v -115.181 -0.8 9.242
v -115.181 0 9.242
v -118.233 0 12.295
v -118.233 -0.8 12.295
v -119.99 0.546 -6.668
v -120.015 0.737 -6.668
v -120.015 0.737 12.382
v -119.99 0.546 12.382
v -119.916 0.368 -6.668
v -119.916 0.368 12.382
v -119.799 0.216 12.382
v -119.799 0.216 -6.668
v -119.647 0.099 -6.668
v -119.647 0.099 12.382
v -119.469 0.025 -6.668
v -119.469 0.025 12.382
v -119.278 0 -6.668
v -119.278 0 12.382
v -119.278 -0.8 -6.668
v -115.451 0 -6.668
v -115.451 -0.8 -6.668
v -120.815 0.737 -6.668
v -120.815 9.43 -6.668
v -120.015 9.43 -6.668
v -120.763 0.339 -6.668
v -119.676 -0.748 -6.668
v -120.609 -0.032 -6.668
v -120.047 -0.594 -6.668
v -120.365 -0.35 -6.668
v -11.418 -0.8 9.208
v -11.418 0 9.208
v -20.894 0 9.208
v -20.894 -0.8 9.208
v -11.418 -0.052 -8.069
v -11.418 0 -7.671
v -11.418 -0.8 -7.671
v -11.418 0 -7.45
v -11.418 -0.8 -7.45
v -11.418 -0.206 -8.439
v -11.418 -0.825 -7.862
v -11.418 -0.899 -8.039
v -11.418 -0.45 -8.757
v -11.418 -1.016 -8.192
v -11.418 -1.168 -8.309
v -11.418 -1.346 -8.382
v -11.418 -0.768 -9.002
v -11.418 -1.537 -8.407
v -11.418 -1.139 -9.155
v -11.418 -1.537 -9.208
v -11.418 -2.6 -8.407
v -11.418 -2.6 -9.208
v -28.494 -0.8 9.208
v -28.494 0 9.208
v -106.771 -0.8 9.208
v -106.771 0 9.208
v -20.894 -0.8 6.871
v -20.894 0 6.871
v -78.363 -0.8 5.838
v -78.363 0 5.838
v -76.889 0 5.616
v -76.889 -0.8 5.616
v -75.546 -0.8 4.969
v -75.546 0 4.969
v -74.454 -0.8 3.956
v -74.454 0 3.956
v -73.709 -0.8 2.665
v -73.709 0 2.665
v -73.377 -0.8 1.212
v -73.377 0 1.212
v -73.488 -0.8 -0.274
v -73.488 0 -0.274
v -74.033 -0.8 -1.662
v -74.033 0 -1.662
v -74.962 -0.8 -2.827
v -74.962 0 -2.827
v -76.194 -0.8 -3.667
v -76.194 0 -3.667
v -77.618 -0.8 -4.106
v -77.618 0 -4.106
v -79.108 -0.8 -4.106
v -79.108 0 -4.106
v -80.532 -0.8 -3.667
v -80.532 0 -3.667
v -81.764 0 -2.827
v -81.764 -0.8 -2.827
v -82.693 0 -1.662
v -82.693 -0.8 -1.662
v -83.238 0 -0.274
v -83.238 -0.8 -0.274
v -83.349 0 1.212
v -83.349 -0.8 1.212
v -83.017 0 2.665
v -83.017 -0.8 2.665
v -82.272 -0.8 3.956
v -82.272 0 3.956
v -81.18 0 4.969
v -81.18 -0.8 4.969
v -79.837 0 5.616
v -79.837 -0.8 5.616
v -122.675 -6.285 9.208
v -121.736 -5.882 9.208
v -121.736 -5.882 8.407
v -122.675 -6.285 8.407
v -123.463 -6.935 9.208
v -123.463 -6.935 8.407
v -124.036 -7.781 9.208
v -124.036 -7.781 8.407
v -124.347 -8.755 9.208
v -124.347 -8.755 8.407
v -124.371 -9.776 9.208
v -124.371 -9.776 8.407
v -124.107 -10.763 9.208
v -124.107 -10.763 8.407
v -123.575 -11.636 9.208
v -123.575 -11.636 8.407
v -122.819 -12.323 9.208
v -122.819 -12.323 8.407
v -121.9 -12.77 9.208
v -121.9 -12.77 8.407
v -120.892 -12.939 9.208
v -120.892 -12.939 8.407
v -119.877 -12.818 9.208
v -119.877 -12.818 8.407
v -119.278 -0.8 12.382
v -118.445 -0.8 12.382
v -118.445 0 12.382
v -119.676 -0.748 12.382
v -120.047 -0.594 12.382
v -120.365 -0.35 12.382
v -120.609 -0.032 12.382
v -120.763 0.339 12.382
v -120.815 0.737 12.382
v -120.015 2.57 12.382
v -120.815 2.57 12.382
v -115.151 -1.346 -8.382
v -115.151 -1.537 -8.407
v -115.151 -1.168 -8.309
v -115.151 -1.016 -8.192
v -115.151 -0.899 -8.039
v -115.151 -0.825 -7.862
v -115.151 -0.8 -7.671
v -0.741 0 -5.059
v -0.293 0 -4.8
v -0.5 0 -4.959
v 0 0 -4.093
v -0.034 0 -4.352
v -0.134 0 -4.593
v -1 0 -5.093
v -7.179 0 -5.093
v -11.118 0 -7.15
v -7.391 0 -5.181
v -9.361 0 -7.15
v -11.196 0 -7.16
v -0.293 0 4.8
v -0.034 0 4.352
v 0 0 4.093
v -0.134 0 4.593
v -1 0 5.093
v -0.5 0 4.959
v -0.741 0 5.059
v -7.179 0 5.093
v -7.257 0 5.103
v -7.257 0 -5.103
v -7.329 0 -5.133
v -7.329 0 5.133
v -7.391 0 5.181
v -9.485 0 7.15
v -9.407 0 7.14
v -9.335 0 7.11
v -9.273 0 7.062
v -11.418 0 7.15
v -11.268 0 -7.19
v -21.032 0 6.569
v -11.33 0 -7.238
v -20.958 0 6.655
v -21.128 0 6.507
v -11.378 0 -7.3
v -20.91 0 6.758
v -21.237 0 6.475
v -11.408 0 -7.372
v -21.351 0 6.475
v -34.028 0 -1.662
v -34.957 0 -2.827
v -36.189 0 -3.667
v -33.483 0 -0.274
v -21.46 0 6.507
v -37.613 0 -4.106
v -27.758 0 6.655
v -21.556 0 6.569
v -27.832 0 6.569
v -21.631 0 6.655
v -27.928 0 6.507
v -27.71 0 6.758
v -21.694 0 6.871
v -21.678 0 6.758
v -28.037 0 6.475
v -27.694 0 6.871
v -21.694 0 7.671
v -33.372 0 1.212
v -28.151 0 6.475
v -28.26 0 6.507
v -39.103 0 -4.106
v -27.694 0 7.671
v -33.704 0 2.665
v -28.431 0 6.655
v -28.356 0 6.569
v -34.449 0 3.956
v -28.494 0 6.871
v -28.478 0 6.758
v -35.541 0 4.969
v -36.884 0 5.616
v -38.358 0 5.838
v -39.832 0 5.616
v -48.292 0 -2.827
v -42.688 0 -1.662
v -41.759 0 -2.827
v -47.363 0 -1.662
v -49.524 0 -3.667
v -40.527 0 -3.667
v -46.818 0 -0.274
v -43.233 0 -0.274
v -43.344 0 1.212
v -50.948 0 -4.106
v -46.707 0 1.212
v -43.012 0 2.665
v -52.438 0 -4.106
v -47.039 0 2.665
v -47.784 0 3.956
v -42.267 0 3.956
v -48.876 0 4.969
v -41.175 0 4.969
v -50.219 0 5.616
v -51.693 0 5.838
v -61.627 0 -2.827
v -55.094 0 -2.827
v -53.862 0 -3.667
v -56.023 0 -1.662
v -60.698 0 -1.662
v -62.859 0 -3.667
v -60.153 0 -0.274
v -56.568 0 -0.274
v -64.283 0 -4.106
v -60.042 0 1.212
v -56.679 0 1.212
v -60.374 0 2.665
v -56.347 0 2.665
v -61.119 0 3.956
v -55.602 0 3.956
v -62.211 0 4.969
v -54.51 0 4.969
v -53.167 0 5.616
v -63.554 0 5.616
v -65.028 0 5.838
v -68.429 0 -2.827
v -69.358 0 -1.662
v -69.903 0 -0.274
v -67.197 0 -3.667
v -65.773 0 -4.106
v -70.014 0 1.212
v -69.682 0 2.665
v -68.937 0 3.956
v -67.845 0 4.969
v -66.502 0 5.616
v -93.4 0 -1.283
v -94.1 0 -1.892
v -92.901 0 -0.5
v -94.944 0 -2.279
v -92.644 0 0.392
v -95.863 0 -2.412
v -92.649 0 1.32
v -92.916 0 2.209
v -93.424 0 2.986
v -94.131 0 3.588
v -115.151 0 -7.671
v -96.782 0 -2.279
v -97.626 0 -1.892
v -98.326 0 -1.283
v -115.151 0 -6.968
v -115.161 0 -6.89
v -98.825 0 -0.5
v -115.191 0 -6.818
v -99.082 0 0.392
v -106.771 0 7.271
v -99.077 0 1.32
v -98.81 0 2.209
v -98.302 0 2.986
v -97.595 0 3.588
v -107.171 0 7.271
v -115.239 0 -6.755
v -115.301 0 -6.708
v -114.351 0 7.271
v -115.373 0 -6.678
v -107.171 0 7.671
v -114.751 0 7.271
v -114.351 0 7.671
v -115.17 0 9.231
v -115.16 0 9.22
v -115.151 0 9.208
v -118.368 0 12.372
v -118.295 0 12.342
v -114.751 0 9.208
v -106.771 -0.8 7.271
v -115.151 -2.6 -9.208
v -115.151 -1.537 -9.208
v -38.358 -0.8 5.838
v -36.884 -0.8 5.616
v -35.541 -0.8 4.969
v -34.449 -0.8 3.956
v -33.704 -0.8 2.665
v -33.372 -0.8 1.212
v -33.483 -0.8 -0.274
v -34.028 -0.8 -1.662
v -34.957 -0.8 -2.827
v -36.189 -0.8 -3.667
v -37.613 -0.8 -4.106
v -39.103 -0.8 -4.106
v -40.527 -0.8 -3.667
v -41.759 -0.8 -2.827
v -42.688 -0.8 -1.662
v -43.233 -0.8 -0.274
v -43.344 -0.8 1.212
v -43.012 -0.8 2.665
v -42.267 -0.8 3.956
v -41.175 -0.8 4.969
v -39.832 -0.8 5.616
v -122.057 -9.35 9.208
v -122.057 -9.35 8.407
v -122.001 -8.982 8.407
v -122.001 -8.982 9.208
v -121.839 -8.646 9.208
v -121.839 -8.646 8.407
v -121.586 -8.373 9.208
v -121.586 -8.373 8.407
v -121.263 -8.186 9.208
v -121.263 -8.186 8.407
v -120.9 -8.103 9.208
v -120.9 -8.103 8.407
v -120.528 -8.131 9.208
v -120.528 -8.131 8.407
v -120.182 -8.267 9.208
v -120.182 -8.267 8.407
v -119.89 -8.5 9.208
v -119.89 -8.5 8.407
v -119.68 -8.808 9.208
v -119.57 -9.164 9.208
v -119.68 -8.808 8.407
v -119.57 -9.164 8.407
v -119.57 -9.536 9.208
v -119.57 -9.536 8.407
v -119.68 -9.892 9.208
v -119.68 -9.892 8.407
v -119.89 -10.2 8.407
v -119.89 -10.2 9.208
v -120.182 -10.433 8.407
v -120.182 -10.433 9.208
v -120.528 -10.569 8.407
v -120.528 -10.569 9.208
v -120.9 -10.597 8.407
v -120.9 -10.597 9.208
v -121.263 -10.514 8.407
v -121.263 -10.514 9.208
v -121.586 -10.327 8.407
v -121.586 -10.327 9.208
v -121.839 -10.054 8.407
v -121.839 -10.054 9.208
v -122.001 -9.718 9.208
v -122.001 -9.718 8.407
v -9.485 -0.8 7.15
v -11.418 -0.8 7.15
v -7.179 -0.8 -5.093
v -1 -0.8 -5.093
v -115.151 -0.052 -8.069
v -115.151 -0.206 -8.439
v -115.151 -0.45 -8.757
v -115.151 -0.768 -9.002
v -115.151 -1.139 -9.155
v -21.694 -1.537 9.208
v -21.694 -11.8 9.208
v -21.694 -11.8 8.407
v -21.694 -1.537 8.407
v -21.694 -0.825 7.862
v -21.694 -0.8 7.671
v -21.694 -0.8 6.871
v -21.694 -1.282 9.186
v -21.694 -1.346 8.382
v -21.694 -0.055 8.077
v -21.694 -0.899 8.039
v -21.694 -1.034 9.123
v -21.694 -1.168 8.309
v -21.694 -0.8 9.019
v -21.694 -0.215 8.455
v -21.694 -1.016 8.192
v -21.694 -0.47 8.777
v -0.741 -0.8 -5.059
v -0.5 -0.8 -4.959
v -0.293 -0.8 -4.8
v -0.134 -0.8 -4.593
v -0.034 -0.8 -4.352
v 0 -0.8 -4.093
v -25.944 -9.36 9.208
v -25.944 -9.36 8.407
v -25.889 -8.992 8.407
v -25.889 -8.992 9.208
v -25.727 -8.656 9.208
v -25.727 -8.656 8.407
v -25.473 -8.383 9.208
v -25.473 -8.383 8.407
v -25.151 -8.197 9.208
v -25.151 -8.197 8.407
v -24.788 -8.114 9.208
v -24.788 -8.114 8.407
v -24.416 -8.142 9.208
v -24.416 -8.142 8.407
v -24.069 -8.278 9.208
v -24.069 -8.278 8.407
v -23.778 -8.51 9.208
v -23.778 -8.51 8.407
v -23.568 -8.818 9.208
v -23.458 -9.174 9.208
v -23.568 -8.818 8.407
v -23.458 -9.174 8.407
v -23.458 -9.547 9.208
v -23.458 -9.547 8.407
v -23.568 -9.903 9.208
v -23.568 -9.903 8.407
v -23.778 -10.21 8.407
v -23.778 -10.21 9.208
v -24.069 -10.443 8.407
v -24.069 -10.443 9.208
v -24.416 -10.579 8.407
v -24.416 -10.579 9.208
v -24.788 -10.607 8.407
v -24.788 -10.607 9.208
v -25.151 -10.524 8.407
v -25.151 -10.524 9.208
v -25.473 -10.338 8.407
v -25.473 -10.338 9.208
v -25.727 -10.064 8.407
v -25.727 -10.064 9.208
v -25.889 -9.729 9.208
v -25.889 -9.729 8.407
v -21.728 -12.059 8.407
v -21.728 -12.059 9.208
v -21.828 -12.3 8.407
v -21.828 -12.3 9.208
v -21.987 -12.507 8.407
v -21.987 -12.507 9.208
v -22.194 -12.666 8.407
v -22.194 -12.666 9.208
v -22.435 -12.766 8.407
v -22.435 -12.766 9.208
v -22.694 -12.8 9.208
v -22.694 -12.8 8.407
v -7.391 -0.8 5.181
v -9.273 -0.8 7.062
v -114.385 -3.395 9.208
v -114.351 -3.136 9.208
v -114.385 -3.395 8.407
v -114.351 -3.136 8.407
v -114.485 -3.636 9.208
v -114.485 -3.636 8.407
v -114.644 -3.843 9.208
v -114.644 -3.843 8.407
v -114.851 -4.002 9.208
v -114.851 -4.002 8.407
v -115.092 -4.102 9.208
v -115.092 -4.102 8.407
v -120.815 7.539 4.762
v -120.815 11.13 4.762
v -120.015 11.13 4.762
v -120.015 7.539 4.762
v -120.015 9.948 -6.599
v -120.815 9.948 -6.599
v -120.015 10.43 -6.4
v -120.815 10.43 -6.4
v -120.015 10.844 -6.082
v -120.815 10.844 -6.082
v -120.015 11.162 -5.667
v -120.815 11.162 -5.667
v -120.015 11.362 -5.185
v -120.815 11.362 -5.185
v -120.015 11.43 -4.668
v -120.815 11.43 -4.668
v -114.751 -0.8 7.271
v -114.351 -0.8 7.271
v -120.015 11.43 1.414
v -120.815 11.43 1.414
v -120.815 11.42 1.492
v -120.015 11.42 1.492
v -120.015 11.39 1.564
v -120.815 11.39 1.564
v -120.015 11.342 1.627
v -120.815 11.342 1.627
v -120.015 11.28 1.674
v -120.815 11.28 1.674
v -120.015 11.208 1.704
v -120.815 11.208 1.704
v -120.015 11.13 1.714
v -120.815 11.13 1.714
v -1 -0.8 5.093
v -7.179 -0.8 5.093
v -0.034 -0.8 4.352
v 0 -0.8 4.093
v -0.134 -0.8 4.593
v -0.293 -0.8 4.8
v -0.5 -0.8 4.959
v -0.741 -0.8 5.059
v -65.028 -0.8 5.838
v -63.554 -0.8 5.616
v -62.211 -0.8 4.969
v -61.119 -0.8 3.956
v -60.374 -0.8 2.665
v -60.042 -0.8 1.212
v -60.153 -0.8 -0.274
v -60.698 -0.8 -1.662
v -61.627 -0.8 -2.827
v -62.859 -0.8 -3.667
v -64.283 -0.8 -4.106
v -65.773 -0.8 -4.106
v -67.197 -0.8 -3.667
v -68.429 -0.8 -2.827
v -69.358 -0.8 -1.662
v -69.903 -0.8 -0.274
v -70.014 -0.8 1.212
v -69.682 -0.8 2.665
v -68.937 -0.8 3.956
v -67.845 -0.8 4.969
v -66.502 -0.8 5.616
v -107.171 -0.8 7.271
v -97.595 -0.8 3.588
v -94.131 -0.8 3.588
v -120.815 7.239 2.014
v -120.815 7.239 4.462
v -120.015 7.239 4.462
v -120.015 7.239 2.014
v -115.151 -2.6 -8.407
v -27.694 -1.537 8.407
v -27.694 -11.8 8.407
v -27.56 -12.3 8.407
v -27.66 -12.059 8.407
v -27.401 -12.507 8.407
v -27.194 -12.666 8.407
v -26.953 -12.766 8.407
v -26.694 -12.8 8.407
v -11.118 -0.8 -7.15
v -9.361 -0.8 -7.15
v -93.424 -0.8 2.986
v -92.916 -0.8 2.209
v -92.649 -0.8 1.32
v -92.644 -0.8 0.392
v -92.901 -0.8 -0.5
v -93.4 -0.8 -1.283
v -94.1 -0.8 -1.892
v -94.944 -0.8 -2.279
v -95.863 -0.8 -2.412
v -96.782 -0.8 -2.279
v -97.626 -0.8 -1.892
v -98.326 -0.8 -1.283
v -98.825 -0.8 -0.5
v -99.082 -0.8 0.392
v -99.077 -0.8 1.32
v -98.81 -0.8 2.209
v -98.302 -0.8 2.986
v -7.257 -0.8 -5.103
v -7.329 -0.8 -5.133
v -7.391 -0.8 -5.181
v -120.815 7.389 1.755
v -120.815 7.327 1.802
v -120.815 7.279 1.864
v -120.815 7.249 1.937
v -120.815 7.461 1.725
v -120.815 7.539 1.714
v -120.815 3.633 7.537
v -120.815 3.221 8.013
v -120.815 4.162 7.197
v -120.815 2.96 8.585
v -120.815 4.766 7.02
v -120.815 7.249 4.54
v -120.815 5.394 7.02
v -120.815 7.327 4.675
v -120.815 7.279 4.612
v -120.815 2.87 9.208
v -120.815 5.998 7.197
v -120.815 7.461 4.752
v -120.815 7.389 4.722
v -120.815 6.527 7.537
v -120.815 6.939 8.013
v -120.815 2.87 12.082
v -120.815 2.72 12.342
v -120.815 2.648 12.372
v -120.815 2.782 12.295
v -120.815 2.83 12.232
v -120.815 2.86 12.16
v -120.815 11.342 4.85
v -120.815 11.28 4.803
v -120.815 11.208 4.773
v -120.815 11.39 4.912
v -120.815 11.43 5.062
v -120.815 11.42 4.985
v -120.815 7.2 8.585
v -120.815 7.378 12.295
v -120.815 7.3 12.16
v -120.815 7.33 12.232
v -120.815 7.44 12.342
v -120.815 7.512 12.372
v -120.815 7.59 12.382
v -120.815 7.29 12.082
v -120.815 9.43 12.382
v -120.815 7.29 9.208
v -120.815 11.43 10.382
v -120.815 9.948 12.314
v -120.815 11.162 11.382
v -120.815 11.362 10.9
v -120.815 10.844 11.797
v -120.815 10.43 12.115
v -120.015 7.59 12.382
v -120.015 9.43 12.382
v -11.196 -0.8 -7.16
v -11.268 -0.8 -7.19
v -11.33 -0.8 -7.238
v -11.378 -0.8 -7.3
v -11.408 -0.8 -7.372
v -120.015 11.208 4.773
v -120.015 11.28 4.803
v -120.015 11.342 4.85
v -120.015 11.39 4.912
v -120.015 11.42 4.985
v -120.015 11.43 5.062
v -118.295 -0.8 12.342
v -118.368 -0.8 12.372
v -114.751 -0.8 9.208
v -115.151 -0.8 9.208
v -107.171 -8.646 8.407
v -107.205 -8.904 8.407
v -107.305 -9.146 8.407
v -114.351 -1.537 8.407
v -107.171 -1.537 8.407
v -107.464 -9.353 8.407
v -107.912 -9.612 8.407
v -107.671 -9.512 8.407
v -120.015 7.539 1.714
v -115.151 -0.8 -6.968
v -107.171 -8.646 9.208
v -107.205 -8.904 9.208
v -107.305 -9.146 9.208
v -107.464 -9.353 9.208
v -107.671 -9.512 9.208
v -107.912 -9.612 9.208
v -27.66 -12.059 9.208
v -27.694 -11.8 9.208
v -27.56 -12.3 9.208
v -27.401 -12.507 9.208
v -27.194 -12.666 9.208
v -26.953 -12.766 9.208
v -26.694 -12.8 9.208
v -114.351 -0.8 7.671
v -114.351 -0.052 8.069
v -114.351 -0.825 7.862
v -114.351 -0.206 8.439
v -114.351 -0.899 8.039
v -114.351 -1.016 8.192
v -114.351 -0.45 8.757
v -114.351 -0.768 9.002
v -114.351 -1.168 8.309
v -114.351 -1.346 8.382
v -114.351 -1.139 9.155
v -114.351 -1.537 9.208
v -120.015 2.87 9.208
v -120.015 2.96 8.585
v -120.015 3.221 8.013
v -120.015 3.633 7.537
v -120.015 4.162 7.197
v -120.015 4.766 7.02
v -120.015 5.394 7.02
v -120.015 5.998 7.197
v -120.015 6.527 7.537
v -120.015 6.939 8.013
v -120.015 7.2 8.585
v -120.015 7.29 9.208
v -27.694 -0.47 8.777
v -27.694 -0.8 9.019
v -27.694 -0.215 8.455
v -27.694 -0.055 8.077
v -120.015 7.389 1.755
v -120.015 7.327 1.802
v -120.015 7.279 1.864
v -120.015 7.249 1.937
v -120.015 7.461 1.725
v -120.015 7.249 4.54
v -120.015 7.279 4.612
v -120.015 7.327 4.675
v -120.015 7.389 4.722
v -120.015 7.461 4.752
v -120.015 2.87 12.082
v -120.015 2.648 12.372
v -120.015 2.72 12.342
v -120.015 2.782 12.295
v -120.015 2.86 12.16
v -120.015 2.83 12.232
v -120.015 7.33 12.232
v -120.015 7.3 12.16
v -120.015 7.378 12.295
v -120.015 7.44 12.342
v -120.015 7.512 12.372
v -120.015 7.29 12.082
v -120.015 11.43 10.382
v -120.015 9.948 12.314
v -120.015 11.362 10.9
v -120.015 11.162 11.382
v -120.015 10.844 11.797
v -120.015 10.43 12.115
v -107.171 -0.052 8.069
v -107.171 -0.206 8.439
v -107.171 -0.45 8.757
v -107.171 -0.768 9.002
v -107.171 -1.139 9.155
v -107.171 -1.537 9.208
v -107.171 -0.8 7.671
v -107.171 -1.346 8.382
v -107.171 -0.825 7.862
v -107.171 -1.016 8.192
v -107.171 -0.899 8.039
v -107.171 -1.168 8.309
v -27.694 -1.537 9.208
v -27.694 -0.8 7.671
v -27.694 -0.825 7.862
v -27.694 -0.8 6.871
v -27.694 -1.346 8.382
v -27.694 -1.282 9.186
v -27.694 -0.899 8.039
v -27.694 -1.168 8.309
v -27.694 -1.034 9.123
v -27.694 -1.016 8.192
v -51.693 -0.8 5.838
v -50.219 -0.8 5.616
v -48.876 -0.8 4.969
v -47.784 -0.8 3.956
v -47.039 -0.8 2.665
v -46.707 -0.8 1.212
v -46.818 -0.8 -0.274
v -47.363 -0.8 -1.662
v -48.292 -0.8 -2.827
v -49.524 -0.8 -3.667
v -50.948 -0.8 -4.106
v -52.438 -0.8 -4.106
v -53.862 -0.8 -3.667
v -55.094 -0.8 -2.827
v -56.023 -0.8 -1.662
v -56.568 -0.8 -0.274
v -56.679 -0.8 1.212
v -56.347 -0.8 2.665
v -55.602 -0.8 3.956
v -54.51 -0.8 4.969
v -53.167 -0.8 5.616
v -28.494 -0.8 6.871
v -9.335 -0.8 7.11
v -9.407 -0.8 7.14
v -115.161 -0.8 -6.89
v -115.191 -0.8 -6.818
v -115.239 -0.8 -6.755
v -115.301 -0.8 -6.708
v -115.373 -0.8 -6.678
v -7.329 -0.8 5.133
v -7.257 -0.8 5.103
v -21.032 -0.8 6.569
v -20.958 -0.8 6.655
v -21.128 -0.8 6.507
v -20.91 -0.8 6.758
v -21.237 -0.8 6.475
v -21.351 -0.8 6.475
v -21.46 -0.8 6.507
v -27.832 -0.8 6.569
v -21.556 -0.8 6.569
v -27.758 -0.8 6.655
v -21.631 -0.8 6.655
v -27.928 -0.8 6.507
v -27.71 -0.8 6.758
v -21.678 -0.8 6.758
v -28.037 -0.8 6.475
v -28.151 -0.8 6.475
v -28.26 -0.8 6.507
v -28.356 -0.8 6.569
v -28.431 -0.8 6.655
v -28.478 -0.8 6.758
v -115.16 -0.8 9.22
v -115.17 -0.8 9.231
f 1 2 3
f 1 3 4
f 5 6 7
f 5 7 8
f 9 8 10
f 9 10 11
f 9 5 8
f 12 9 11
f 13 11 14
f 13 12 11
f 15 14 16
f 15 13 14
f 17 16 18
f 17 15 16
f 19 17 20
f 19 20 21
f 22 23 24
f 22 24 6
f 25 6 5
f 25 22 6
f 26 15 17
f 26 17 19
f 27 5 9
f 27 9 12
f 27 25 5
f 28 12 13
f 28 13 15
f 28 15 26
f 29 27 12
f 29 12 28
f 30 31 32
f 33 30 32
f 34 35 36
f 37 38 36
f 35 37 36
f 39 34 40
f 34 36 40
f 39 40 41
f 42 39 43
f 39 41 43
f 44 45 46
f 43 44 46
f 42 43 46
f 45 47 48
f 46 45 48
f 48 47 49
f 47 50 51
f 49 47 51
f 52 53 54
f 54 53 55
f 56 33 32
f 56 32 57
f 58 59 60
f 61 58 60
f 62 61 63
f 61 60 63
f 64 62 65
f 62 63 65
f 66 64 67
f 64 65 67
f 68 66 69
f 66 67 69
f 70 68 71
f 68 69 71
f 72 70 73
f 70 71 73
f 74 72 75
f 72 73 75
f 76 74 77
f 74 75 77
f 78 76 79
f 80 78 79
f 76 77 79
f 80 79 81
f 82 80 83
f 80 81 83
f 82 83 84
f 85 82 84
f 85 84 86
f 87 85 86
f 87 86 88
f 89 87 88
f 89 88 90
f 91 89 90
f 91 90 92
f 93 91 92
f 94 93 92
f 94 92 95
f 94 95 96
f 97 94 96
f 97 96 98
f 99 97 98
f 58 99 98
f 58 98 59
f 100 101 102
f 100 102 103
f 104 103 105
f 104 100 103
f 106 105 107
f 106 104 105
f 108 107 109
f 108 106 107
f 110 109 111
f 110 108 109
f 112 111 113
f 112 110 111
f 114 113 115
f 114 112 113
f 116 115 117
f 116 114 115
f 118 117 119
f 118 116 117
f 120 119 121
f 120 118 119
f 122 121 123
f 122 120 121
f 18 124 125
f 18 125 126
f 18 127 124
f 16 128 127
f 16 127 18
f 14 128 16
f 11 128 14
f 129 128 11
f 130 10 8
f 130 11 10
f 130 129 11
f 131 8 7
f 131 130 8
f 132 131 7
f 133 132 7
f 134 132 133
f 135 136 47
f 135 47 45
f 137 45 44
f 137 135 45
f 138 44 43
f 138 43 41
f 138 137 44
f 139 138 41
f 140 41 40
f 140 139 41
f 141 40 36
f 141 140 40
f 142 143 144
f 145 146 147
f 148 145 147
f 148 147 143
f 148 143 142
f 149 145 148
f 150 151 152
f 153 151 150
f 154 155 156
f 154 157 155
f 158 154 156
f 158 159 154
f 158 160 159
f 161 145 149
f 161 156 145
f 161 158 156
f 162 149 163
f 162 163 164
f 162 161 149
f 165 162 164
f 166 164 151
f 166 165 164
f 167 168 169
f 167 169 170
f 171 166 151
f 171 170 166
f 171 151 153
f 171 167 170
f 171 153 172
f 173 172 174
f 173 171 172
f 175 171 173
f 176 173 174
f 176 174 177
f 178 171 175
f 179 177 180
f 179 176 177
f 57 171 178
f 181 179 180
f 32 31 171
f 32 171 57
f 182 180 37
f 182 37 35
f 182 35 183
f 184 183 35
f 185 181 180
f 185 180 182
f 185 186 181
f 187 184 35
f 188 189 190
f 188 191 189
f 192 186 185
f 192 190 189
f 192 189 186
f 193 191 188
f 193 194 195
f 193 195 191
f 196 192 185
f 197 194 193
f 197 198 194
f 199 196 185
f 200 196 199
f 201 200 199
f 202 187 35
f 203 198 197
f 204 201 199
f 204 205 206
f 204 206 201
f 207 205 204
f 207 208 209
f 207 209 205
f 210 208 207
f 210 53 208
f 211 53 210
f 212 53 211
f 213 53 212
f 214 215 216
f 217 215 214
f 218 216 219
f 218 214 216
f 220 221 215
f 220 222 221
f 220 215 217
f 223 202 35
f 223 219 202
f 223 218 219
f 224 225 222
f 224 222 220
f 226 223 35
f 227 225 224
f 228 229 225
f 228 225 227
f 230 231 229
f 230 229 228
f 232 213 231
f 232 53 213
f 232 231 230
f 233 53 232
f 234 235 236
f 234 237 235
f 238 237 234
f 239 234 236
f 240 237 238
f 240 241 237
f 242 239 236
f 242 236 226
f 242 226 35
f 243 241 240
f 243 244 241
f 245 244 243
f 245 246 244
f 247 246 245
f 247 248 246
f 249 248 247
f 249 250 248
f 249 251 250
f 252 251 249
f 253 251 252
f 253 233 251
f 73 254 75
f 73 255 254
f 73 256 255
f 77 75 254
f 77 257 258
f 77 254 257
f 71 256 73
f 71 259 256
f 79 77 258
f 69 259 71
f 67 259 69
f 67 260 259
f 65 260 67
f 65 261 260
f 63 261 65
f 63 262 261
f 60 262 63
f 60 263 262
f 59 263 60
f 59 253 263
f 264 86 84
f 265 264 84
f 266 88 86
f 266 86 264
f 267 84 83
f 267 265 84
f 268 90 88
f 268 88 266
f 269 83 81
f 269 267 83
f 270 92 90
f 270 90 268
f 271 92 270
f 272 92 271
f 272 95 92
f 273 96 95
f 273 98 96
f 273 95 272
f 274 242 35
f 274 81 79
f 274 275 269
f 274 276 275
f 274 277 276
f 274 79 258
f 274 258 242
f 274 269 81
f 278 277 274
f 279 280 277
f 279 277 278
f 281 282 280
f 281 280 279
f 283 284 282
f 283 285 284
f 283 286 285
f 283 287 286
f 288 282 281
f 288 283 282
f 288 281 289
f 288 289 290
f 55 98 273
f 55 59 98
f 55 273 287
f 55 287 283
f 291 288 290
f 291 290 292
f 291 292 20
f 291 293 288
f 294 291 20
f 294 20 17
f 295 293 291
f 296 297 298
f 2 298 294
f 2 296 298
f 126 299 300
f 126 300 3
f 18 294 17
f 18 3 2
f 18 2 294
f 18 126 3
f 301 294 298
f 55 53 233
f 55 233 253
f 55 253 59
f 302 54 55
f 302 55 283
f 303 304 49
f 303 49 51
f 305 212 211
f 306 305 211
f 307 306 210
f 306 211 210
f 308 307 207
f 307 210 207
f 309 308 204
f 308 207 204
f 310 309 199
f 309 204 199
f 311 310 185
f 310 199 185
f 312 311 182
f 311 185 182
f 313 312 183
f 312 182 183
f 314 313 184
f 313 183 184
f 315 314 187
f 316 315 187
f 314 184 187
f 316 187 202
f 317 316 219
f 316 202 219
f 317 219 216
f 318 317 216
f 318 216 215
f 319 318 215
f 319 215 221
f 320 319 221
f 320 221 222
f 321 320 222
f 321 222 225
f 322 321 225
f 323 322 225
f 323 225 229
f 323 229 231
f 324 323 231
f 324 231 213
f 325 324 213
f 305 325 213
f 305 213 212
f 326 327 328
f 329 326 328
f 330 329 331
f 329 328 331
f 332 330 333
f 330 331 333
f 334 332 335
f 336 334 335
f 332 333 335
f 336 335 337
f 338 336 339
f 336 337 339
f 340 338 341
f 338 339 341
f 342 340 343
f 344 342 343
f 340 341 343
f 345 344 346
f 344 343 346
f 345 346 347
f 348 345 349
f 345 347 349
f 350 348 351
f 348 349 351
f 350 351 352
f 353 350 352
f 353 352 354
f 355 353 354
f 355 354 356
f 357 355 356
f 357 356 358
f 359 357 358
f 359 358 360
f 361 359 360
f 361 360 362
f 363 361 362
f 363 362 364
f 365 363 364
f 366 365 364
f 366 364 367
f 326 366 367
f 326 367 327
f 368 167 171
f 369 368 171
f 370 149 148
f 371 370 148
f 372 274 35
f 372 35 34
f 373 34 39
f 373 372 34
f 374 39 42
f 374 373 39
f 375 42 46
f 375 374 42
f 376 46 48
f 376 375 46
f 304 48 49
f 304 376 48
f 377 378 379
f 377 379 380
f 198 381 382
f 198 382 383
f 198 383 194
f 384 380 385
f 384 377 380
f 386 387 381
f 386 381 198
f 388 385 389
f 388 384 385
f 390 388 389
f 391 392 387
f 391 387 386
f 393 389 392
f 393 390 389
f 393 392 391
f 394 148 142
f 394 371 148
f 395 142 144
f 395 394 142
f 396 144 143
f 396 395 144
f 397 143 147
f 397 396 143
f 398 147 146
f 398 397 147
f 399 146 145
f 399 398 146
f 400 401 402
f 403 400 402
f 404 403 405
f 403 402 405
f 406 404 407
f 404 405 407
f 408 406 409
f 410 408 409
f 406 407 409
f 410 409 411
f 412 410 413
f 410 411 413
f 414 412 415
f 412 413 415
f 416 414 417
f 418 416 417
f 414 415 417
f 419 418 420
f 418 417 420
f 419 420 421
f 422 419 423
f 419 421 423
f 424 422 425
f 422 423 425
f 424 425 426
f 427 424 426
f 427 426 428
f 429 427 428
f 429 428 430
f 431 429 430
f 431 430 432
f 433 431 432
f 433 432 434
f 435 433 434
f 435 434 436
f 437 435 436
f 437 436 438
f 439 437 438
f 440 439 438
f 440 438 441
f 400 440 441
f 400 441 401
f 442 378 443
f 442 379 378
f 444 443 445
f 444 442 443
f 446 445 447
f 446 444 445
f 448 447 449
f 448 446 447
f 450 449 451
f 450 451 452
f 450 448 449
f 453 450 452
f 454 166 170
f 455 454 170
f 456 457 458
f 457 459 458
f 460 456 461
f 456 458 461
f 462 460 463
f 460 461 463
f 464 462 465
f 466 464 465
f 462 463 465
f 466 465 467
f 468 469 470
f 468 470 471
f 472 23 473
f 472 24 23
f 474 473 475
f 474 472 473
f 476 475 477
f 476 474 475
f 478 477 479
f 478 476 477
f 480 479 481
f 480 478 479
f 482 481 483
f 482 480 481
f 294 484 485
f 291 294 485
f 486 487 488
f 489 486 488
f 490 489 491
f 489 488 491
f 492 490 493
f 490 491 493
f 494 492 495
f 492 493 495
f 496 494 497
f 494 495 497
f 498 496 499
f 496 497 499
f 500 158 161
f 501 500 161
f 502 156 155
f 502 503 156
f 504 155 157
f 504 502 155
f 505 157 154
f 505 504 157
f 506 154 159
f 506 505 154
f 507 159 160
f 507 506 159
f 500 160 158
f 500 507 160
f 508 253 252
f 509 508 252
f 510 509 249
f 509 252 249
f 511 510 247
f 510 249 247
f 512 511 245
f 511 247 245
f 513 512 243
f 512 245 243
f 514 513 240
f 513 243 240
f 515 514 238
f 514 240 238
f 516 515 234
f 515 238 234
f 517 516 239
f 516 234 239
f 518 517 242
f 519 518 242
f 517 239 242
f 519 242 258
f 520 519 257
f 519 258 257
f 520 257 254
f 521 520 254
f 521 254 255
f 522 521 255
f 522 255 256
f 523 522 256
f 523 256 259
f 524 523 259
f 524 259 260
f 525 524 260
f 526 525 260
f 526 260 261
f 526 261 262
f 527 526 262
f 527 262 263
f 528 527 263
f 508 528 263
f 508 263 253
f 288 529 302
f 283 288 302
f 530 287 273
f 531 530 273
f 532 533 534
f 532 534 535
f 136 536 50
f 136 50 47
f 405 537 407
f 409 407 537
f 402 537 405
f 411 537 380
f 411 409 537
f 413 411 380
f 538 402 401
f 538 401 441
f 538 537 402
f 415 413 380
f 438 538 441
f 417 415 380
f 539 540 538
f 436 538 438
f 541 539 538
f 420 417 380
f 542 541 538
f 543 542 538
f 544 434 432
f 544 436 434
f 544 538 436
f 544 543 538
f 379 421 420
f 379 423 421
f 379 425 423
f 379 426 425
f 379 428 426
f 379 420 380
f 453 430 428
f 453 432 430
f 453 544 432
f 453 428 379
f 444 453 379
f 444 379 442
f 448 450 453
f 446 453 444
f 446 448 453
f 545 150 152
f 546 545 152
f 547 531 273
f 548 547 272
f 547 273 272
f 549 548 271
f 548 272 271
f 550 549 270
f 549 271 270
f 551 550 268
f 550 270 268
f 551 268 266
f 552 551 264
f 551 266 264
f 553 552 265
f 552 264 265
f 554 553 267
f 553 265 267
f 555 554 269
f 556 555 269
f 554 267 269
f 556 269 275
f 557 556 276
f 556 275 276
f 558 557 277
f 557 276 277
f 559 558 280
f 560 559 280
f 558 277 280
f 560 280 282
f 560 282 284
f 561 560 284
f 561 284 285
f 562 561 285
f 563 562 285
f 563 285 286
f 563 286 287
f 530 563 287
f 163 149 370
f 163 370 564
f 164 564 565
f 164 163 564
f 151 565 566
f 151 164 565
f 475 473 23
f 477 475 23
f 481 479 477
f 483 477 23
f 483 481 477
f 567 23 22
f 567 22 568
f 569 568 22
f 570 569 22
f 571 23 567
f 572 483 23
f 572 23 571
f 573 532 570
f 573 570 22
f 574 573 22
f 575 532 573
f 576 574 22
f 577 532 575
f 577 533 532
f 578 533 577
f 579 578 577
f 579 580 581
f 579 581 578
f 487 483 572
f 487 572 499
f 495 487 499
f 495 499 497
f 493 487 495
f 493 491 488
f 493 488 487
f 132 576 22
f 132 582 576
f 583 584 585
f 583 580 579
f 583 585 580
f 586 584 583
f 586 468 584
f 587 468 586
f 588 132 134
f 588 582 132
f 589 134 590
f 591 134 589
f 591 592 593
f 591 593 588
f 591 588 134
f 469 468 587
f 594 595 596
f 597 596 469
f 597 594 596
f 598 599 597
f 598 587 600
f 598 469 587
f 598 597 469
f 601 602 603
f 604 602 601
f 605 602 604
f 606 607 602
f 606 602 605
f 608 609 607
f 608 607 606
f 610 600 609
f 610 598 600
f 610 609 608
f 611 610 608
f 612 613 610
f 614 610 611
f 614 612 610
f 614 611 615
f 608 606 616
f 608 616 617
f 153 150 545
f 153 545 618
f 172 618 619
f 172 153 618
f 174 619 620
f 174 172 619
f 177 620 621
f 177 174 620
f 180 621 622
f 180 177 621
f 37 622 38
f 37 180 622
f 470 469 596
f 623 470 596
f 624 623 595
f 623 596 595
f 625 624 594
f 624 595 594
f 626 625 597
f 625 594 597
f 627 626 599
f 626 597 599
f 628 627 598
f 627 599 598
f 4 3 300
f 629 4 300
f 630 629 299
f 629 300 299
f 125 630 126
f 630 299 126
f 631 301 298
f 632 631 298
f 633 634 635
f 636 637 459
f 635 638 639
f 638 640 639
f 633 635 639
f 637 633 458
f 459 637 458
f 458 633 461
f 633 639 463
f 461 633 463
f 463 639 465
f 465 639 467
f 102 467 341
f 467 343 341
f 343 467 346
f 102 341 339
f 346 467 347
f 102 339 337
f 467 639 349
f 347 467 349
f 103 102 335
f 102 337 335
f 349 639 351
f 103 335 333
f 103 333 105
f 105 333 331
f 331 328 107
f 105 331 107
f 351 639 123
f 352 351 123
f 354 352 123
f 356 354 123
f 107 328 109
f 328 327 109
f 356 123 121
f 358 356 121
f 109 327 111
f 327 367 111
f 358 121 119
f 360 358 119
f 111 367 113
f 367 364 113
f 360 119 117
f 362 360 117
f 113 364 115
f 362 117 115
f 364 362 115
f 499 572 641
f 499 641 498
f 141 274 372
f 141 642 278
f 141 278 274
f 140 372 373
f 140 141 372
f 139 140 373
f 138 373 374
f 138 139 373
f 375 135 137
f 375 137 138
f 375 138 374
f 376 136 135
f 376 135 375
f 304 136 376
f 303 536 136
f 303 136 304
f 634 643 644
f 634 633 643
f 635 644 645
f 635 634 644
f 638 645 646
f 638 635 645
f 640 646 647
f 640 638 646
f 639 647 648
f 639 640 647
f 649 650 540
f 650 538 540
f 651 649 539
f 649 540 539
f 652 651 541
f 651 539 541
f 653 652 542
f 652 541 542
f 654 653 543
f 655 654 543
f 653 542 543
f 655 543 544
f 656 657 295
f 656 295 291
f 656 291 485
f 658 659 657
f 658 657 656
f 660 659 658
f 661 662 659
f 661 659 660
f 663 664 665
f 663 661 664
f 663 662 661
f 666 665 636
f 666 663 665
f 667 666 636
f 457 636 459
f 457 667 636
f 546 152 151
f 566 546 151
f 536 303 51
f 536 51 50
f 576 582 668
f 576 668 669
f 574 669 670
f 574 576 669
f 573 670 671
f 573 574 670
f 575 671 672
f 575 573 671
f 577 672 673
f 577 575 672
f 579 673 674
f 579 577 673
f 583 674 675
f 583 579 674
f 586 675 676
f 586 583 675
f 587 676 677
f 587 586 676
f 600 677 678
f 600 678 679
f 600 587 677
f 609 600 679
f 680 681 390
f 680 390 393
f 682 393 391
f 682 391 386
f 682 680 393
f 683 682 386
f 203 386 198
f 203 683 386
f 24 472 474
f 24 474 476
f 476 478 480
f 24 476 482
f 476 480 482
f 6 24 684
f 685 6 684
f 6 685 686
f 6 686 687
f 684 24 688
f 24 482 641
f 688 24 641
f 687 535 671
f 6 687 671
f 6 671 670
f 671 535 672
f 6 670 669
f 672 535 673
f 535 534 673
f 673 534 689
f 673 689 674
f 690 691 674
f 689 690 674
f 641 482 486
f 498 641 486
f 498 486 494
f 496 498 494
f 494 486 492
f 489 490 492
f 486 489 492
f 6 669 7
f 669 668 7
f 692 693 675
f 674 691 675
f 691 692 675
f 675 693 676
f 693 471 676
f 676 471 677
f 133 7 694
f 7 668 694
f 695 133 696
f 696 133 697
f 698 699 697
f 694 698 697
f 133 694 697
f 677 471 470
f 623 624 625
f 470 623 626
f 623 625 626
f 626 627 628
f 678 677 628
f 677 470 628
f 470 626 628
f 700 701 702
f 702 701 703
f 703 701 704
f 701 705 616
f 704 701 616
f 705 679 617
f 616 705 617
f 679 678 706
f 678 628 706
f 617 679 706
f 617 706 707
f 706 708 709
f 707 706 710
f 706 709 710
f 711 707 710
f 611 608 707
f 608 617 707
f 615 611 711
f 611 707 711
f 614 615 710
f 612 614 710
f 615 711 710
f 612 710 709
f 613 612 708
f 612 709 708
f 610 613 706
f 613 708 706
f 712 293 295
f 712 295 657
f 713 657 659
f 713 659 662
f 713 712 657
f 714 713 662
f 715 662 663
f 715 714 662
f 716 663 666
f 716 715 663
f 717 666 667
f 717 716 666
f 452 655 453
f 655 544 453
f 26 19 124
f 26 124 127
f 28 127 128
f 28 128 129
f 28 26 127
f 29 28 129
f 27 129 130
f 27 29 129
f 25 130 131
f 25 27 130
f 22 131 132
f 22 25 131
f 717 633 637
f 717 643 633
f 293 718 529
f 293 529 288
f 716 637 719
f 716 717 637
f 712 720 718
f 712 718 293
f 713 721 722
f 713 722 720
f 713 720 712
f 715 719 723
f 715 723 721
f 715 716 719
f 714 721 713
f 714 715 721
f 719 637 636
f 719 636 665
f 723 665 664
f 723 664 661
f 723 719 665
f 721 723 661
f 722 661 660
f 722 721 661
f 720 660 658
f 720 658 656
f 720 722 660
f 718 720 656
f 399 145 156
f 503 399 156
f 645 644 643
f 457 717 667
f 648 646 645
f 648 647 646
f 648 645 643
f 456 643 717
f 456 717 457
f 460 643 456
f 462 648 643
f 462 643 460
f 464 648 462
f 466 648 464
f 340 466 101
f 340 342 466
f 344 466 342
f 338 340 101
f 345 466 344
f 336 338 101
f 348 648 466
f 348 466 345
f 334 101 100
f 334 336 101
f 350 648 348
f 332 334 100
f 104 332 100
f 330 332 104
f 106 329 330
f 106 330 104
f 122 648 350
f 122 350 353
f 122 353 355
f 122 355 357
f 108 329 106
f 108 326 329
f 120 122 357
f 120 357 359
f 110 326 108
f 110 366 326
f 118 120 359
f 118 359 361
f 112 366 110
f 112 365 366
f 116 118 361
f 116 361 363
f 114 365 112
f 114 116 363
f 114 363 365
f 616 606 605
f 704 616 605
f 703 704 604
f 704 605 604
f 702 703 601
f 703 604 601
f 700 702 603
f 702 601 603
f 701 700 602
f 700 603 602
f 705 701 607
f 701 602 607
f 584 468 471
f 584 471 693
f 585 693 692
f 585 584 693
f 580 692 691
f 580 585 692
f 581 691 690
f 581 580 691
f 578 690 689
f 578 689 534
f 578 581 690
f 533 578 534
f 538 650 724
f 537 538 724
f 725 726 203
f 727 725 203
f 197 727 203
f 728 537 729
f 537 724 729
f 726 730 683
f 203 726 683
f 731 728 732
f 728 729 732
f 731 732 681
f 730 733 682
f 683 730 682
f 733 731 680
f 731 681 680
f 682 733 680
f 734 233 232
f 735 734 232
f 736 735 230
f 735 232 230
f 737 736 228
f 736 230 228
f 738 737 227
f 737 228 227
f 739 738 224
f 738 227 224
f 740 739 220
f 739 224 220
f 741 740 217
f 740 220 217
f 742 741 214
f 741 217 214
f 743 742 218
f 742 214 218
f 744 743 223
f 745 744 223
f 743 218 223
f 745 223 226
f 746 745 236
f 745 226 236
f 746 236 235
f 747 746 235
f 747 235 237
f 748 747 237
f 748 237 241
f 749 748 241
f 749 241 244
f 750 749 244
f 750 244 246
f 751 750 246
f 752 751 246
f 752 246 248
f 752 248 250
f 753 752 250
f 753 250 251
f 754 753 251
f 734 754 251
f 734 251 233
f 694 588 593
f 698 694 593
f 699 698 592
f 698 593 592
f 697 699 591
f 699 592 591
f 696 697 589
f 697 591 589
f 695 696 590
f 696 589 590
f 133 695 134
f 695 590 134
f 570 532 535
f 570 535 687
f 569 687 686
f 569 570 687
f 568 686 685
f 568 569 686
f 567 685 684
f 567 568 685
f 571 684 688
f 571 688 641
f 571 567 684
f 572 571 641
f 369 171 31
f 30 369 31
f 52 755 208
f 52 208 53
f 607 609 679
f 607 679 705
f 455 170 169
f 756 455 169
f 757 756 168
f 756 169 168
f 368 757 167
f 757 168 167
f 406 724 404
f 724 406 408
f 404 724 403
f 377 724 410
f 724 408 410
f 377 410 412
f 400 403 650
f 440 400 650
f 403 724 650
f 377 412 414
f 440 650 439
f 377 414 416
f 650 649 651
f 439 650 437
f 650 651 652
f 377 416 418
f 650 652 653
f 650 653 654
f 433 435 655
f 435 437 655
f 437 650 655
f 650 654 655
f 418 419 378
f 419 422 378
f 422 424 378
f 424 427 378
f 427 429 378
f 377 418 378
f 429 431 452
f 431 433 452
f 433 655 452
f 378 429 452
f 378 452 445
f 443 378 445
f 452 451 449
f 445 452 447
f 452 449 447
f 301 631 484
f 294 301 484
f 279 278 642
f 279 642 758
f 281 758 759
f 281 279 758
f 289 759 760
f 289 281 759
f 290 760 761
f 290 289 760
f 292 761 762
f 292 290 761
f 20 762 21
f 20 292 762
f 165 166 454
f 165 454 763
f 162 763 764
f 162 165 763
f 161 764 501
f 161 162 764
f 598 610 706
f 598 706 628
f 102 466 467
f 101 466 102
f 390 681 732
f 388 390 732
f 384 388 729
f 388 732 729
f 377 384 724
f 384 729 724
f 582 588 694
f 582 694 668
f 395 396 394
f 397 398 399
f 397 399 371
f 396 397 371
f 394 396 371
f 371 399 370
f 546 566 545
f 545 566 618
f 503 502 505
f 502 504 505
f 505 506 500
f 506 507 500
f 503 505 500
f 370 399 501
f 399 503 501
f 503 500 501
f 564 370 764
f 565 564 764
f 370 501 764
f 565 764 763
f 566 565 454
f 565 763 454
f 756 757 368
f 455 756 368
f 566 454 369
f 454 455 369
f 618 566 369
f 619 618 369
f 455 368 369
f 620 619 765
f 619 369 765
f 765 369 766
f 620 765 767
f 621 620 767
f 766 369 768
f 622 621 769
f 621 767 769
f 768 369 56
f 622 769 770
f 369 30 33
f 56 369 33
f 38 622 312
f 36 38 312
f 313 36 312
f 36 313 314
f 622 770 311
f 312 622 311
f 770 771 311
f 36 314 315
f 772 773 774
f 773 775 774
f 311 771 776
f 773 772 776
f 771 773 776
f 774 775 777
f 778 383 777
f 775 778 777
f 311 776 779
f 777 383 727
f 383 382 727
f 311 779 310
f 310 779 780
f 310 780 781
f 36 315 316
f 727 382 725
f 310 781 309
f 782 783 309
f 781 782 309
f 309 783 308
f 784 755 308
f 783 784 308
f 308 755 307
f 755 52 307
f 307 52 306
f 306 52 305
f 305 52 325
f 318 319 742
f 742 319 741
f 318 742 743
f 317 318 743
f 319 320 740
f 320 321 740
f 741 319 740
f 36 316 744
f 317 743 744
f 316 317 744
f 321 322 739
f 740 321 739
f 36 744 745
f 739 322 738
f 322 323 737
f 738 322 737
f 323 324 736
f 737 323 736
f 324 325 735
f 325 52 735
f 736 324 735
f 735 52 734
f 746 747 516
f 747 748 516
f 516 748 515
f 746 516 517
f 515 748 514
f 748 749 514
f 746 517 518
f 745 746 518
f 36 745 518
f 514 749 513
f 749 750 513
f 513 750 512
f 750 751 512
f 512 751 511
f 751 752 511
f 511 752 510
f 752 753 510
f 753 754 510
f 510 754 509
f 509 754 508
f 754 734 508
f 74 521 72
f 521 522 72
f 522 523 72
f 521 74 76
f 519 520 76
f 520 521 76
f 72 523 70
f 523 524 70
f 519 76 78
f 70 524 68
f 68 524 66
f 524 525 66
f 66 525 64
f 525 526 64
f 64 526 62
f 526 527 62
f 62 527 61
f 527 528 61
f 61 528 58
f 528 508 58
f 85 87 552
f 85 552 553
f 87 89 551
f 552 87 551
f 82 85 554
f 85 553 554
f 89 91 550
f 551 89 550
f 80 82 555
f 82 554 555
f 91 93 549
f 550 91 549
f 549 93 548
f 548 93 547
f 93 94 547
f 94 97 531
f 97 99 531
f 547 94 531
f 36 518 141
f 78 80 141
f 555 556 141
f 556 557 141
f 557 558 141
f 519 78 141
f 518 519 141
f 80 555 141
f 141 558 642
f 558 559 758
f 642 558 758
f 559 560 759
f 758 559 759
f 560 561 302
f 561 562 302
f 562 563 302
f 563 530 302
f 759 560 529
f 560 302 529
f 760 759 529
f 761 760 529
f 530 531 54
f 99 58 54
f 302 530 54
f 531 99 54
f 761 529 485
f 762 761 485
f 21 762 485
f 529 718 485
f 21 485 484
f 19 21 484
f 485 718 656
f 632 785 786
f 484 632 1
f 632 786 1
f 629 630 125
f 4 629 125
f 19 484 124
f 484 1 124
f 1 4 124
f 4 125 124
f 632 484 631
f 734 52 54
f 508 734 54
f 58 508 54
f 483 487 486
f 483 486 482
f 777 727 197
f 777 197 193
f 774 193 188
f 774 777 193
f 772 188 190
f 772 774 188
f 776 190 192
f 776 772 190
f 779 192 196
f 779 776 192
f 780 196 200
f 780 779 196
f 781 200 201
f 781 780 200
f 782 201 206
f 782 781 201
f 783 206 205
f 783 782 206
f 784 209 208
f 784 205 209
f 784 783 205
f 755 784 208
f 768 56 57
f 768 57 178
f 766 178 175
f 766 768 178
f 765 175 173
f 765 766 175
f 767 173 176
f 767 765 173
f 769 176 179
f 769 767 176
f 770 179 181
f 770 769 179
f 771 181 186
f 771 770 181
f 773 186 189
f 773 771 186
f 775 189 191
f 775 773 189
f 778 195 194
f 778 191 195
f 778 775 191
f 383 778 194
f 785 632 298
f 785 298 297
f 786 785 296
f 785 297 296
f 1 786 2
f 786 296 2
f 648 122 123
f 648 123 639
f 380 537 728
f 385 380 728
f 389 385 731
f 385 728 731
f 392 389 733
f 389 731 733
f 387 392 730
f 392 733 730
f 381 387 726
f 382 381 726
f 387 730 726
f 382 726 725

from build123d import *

# Parameters (mm, degrees)
BASE_FLANGE1_DEPTH            = 0.8
EDGE_FLANGE1_STRIP_W          = 4.6732
EDGE_FLANGE1_STRIP_H          = 0.8
EDGE_FLANGE1_STRIP_CUT_DEPTH  = 19.05
EDGE_FLANGE1_DEPTH            = 19.05
EDGE_FLANGE1_START            = 0.8
EDGE_FLANGE1_FLAT_DEPTH       = 0.8
CHAMFER2_SIZE                 = 3.17
EDGE_FLANGE2_START            = -1.5366
EDGE_FLANGE2_DEPTH            = 2.5366
EDGE_FLANGE2_START_2          = -0.084496
EDGE_FLANGE2_2_OUTLINE_W      = 6
EDGE_FLANGE2_2_OUTLINE_H      = 0.8
EDGE_FLANGE2_2_DEPTH          = 1.084496
EDGE_FLANGE2_START_3          = -12.8
EDGE_FLANGE2_3_OUTLINE_W      = 6
EDGE_FLANGE2_3_OUTLINE_H      = 0.8
EDGE_FLANGE2_3_DEPTH          = 11.2634
EDGE_FLANGE2_START_4          = -27.694130054
EDGE_FLANGE2_4_DEPTH          = 6
EDGE_FLANGE2_5_DEPTH          = 6
EDGE_FLANGE4_STRIP_W          = 4.6732
EDGE_FLANGE4_STRIP_H          = 0.8
EDGE_FLANGE4_STRIP_CUT_DEPTH  = 7.17999872
EDGE_FLANGE4_RELIEF_W         = 5.0732
EDGE_FLANGE4_RELIEF_H         = 0.4
EDGE_FLANGE4_RELIEF_CUT_DEPTH = 0.8
EDGE_FLANGE4_DEPTH            = 7.17999872
EDGE_FLANGE4_FLAT_DEPTH       = 0.8
M3X0_5_TAPPED_HOLE1_D         = 2.5
EDGE_FLANGE3_STRIP_W          = 4.6732
EDGE_FLANGE3_STRIP_H          = 0.8
EDGE_FLANGE3_STRIP_CUT_DEPTH  = 103.732625794
EDGE_FLANGE3_DEPTH            = 103.732625794
SKETCH21_R                    = 5
CUT_EXTRUDE1_DEPTH            = 126.679221242
FILLET1_R                     = 1
FILLET3_R                     = 2
FILLET4_R                     = 0.3
FILLET5_R                     = 1


with BuildPart() as part:
    # Base-Flange1: sheet metal written as solids
    # Sketch2 → Base-Flange1 (new body)
    with BuildSketch(Plane(origin=(0, 0, 0), x_dir=(1, 0, 0), z_dir=(0, 1, 0))):
        Polygon((-115.1509, -12.3825), (-120.015, -12.3825), (-120.015, 6.6675), (-115.1509, 6.6675), (-115.1509, 9.2075), (-11.418274206, 9.2075), (-11.418274206, 7.1501), (-9.360874206, 7.1501), (-7.303474206, 5.0927), (0, 5.0927), (0, -5.0927), (-7.303474206, -5.0927), (-9.360874206, -7.1501), (-11.418274206, -7.1501), (-11.418274206, -9.2075), (-115.1509, -9.2075), align=None)
    extrude(amount=-BASE_FLANGE1_DEPTH)

    # Edge-Flange1: sheet metal written as solids
    # Edge-Flange1 strip (on a plane across the edge) → Edge-Flange1 strip cut (cut)
    with BuildSketch(Plane(origin=(-120.015, 0, -6.6675), x_dir=(1, 0, 0), z_dir=(0, 0, 1))):
        with Locations((-1.6, -0.4)):
            Rectangle(EDGE_FLANGE1_STRIP_W, EDGE_FLANGE1_STRIP_H)
    extrude(amount=EDGE_FLANGE1_STRIP_CUT_DEPTH, mode=Mode.SUBTRACT)

    # Edge-Flange1 bend section (on a plane across the edge) → Edge-Flange1 (add)
    with BuildSketch(Plane(origin=(-120.015, 0, -6.6675), x_dir=(1, 0, 0), z_dir=(0, 0, 1))):
        with BuildLine():
            Line((-0.8, 0.7366), (0, 0.7366))
            ThreePointArc((0, 0.7366), (0.215745145, 0.215745145), (0.7366, 0))
            Line((0.7366, 0), (0.7366, -0.8))
            ThreePointArc((0.7366, -0.8), (-0.34994028, -0.34994028), (-0.8, 0.7366))
        make_face()
    extrude(amount=EDGE_FLANGE1_DEPTH)

    # Edge-Flange1 profile (on flange) → Edge-Flange1 flat (add)
    with BuildSketch(Plane.ZY.offset(120.015).offset(EDGE_FLANGE1_START)):
        with BuildLine():
            ThreePointArc((9.2075, 2.8702), (6.9977, 5.08), (9.2075, 7.2898))
            Line((9.2075, 7.2898), (12.3825, 7.2898))
            Line((12.3825, 7.2898), (12.3825, 11.43))
            Line((12.3825, 11.43), (4.7625, 11.43))
            Line((4.7625, 11.43), (4.7625, 7.239))
            Line((4.7625, 7.239), (1.7145, 7.239))
            Line((1.7145, 7.239), (1.7145, 11.43))
            Line((1.7145, 11.43), (-6.6675, 11.43))
            Line((-6.6675, 11.43), (-6.6675, 0.7366))
            Line((-6.6675, 0.7366), (12.3825, 0.7366))
            Line((12.3825, 0.7366), (12.3825, 2.8702))
            Line((12.3825, 2.8702), (9.2075, 2.8702))
        make_face()
    extrude(amount=-EDGE_FLANGE1_FLAT_DEPTH)

    # Chamfer2
    chamfer2_edges = [part.edges().sort_by_distance(p)[0] for p in [
        (-115.1509, -0.4, 12.3825),
    ]]
    chamfer(chamfer2_edges, length=CHAMFER2_SIZE)

    # Edge-Flange2: read off the stored shape, not the designer's step
    # Edge-Flange2 outline → Edge-Flange2 (cut)
    with BuildSketch(Plane(origin=(0, 0, 0), x_dir=(1, 0, 0), z_dir=(0, 1, 0)).offset(EDGE_FLANGE2_START)):
        with BuildLine():
            Line((-28.494130054, -9.2075), (-27.694130054, -9.2075))
            Line((-27.694130054, -9.2075), (-27.694130054, -6.8709))
            ThreePointArc((-27.694130054, -6.8709), (-28.094130054, -6.4709), (-28.494130054, -6.8709))
            Line((-28.494130054, -6.8709), (-28.494130054, -9.2075))
        make_face()
        with BuildLine():
            Line((-21.694130054, -6.8709), (-21.694130054, -9.2075))
            Line((-21.694130054, -9.2075), (-20.894130054, -9.2075))
            Line((-20.894130054, -9.2075), (-20.894130054, -6.8709))
            ThreePointArc((-20.894130054, -6.8709), (-21.294130054, -6.4709), (-21.694130054, -6.8709))
        make_face()
    extrude(amount=EDGE_FLANGE2_DEPTH, mode=Mode.SUBTRACT)

    # Edge-Flange2 2 outline → Edge-Flange2 2 (cut)
    with BuildSketch(Plane(origin=(0, 0, 0), x_dir=(1, 0, 0), z_dir=(0, 1, 0)).offset(EDGE_FLANGE2_START_2)):
        with Locations((-24.694130054, -8.8075)):
            Rectangle(EDGE_FLANGE2_2_OUTLINE_W, EDGE_FLANGE2_2_OUTLINE_H)
    extrude(amount=EDGE_FLANGE2_2_DEPTH, mode=Mode.SUBTRACT)

    # Edge-Flange2 4 outline → Edge-Flange2 4 (cut)
    with BuildSketch(Plane.YZ.offset(EDGE_FLANGE2_START_4)):
        with BuildLine():
            Line((-0.8, 9.2075), (-0.8, 9.019439951))
            ThreePointArc((-0.8, 9.019439951), (-0.215048049, 8.454889796), (0, 7.6709))
            Line((0, 7.6709), (0, 8.4075))
            Line((0, 8.4075), (-0.084496, 8.4075))
            Line((-0.084496, 8.4075), (-0.084496, 9.2075))
            Line((-0.084496, 9.2075), (-0.8, 9.2075))
        make_face()
    extrude(amount=EDGE_FLANGE2_4_DEPTH, mode=Mode.SUBTRACT)



with BuildPart() as body_2:
    # Edge-Flange2 3 outline → Edge-Flange2 3 (new body)
    with BuildSketch(Plane(origin=(0, 0, 0), x_dir=(1, 0, 0), z_dir=(0, 1, 0)).offset(EDGE_FLANGE2_START_3)):
        with Locations((-24.694130054, -8.8075)):
            Rectangle(EDGE_FLANGE2_3_OUTLINE_W, EDGE_FLANGE2_3_OUTLINE_H)
    extrude(amount=EDGE_FLANGE2_3_DEPTH)


with BuildPart() as part_1:
    add(part.part)

    add(body_2.part)  # Edge-Flange2 5 merges body 2
    # Edge-Flange2 5 outline → Edge-Flange2 5 (add)
    with BuildSketch(Plane.YZ.offset(EDGE_FLANGE2_START_4)):
        with BuildLine():
            ThreePointArc((-0.8, 9.019439951), (-1.156486155, 9.159742848), (-1.5366, 9.2075))
            Line((-1.5366, 9.2075), (-1.5366, 8.4075))
            ThreePointArc((-1.5366, 8.4075), (-1.015745145, 8.191754855), (-0.8, 7.6709))
            Line((-0.8, 7.6709), (-0.8, 9.019439951))
        make_face()
    extrude(amount=EDGE_FLANGE2_5_DEPTH)

    # Edge-Flange4: sheet metal written as solids
    # Edge-Flange4 strip (on a plane across the edge) → Edge-Flange4 strip cut (cut)
    with BuildSketch(Plane(origin=(-107.17090128, -0.8, 9.2075), x_dir=(0, 0, -1), z_dir=(-1, 0, 0))):
        with Locations((-0.8, -0.4)):
            Rectangle(EDGE_FLANGE4_STRIP_W, EDGE_FLANGE4_STRIP_H)
    extrude(amount=EDGE_FLANGE4_STRIP_CUT_DEPTH, mode=Mode.SUBTRACT)

    # Edge-Flange4 relief (on the sheet) → Edge-Flange4 relief cut (cut)
    with BuildSketch(Plane(origin=(-107.17090128, -0.8, 7.6709), x_dir=(0, 0, -1), z_dir=(0, -1, 0))):
        with Locations((-2.1366, 0.2)):
            Rectangle(EDGE_FLANGE4_RELIEF_W, EDGE_FLANGE4_RELIEF_H)
        with Locations((-2.1366, -7.37999872)):
            Rectangle(EDGE_FLANGE4_RELIEF_W, EDGE_FLANGE4_RELIEF_H)
    extrude(amount=-EDGE_FLANGE4_RELIEF_CUT_DEPTH, mode=Mode.SUBTRACT)

    # Edge-Flange4 bend section (on a plane across the edge) → Edge-Flange4 (add)
    with BuildSketch(Plane(origin=(-107.17090128, -0.8, 9.2075), x_dir=(0, 0, -1), z_dir=(-1, 0, 0))):
        with BuildLine():
            Line((0, 0.7366), (0.8, 0.7366))
            ThreePointArc((0.8, 0.7366), (1.015745145, 0.215745145), (1.5366, 0))
            Line((1.5366, 0), (1.5366, -0.8))
            ThreePointArc((1.5366, -0.8), (0.45005972, -0.34994028), (0, 0.7366))
        make_face()
    extrude(amount=EDGE_FLANGE4_DEPTH)

    # Edge-Flange4 profile (on flange) → Edge-Flange4 flat (add)
    with BuildSketch(Plane(origin=(0, -0.8, 9.2075), x_dir=(-1, 0, 0), z_dir=(0, 0, 1))):
        with BuildLine():
            ThreePointArc((121.735691381, 5.082325102), (124.274204272, 9.479158406), (119.877370968, 12.017671298))
            Line((119.877370968, 12.017671298), (107.17090128, 8.612983007))
            Line((107.17090128, 8.612983007), (107.17090128, 0.7366))
            Line((107.17090128, 0.7366), (114.3509, 0.7366))
            Line((114.3509, 0.7366), (114.3509, 3.103576215))
            Line((114.3509, 3.103576215), (121.735691381, 5.082325102))
        make_face()
    extrude(amount=-EDGE_FLANGE4_FLAT_DEPTH)

    # M3x0.5 Tapped Hole1 (through all)
    with Locations(Plane.XY.offset(9.2075)):
        with Locations((-120.806531174, -9.3499982), (-24.694130054, -9.36023907)):
            Hole(M3X0_5_TAPPED_HOLE1_D / 2)

    # Edge-Flange3: sheet metal written as solids
    # Edge-Flange3 strip (on a plane across the edge) → Edge-Flange3 strip cut (cut)
    with BuildSketch(Plane(origin=(-115.1509, -0.8, -9.2075), x_dir=(0, 0, 1), z_dir=(1, 0, 0))):
        with Locations((-0.8, -0.4)):
            Rectangle(EDGE_FLANGE3_STRIP_W, EDGE_FLANGE3_STRIP_H)
    extrude(amount=EDGE_FLANGE3_STRIP_CUT_DEPTH, mode=Mode.SUBTRACT)

    # Edge-Flange3 section (on a plane across the edge) → Edge-Flange3 (add)
    with BuildSketch(Plane(origin=(-115.1509, -0.8, -9.2075), x_dir=(0, 0, 1), z_dir=(1, 0, 0))):
        with BuildLine():
            Line((0, 0.7366), (0, 1.8))
            Line((0, 1.8), (0.8, 1.8))
            Line((0.8, 1.8), (0.8, 0.7366))
            ThreePointArc((0.8, 0.7366), (1.015745145, 0.215745145), (1.5366, 0))
            Line((1.5366, 0), (1.5366, -0.8))
            ThreePointArc((1.5366, -0.8), (0.45005972, -0.34994028), (0, 0.7366))
        make_face()
    extrude(amount=EDGE_FLANGE3_DEPTH)

    # Sketch21 → Cut-Extrude1 (cut, through all)
    with BuildSketch(Plane(origin=(0, 0, 0), x_dir=(1, 0, 0), z_dir=(0, 1, 0))):
        with Locations(Location((-78.363042127, -0.838303057, 0), (0, 0, 270))):
            Circle(SKETCH21_R)
        with Locations(Location((-65.028050672, -0.838303057, 0), (0, 0, 270))):
            Circle(SKETCH21_R)
        with Locations(Location((-51.693043958, -0.838303057, 0), (0, 0, 270))):
            Circle(SKETCH21_R)
        with Locations(Location((-38.358052503, -0.838303057, 0), (0, 0, 270))):
            Circle(SKETCH21_R)
        with BuildLine():
            Line((-97.595092935, -3.588303057), (-94.13099132, -3.588303057))
            ThreePointArc((-94.13099132, -3.588303057), (-95.863042127, 2.411696943), (-97.595092935, -3.588303057))
        make_face()
    extrude(amount=-CUT_EXTRUDE1_DEPTH, mode=Mode.SUBTRACT)

    # Fillet1
    fillet1_edges = [part_1.edges().sort_by_distance(p)[0] for p in [
        (0, -0.4, -5.0927),
        (0, -0.4, 5.0927),
    ]]
    fillet(fillet1_edges, radius=FILLET1_R)

    # Fillet3
    fillet3_edges = [part_1.edges().sort_by_distance(p)[0] for p in [
        (-120.415, 11.43, -6.6675),
        (-120.415, 11.43, 12.3825),
    ]]
    fillet(fillet3_edges, radius=FILLET3_R)

    # Fillet4
    # the kernel refuses this fillet: 0.3 mm, written as the material it adds along each edge
    with BuildSketch(Plane(origin=(-115.1509, 0, -6.6675), x_dir=(-1, 0, 0), z_dir=(0, -1, 0))) as fillet4_piece_1:
        with BuildLine():
            CenterArc((FILLET4_R, FILLET4_R), FILLET4_R, 180, 90)
            Line((0, FILLET4_R), (0, 0))
            Line((0, 0), (FILLET4_R, 0))
        make_face()
    extrude(amount=0.8)
    with BuildSketch(Plane(origin=(-11.418274206, 0, -7.1501), x_dir=(1, 0, 0), z_dir=(0, -1, 0)), Plane(origin=(-120.815, 7.239, 4.7625), x_dir=(0, 1, 0), z_dir=(1, 0, 0)), Plane(origin=(-120.815, 7.239, 1.7145), x_dir=(0, 0, 1), z_dir=(1, 0, 0))) as fillet4_piece_2:
        with BuildLine():
            CenterArc((FILLET4_R, -FILLET4_R), FILLET4_R, 90, 90)
            Line((0, -FILLET4_R), (0, 0))
            Line((0, 0), (FILLET4_R, 0))
        make_face()
    extrude(amount=0.8)
    with BuildSketch(Plane(origin=(-7.303474206, 0, -5.0927), x_dir=(1, 0, 0), z_dir=(0, -1, 0))) as fillet4_piece_3:
        with BuildLine():
            CenterArc((FILLET4_R * 0.414213562373, -FILLET4_R), FILLET4_R, 90, 45)
            Line((-FILLET4_R * 0.292893218813, -FILLET4_R * 0.292893218813), (0, 0))
            Line((0, 0), (FILLET4_R * 0.414213562373, 0))
        make_face()
    extrude(amount=0.8)
    with BuildSketch(Plane(origin=(-7.303474206, 0, 5.0927), x_dir=(1, 0, 0), z_dir=(0, -1, 0))) as fillet4_piece_4:
        with BuildLine():
            CenterArc((FILLET4_R * 0.414213562373, FILLET4_R), FILLET4_R, 225, 45)
            Line((-FILLET4_R * 0.292893218813, FILLET4_R * 0.292893218813), (0, 0))
            Line((0, 0), (FILLET4_R * 0.414213562373, 0))
        make_face()
    extrude(amount=0.8)
    # the kernel refuses this fillet: 0.3 mm, written as the material it takes off along each edge
    with BuildSketch(Plane(origin=(-115.1509, 0.1059659, 9.2125), x_dir=(-0.7071067811864428, 0, 0.7071067811866523), z_dir=(0, -1, 0))) as fillet4_2_piece_1:
        with BuildLine():
            CenterArc((0.04238636, 0.3), FILLET4_R, 261.194947533, 8.805052467)
            Line((-0.003535534, 0.003535534), (0, 0))
            Line((0, 0), (0.04238636, 0))
        make_face()
    extrude(amount=1.0119318, mode=Mode.SUBTRACT)
    with BuildSketch(Plane(origin=(-9.360874206, 0.310660172, 7.1501), x_dir=(-1, 0, 0), z_dir=(0, -1, 0)), Plane(origin=(-118.3209, 0.310660172, 12.3825), x_dir=(-1, 0, 0), z_dir=(0, -1, 0))) as fillet4_2_piece_2:
        with BuildLine():
            CenterArc((FILLET4_R * 0.414213562373, FILLET4_R), FILLET4_R, 225, 45)
            Line((-FILLET4_R * 0.292893218813, FILLET4_R * 0.292893218813), (0, 0))
            Line((0, 0), (FILLET4_R * 0.414213562373, 0))
        make_face()
    extrude(amount=1.421320344, mode=Mode.SUBTRACT)
    with BuildSketch(Plane(origin=(-121.565, 2.8702, 12.3825), x_dir=(0, 0, -1), z_dir=(1, 0, 0)), Plane(origin=(-121.565, 7.2898, 12.3825), x_dir=(0, 1, 0), z_dir=(1, 0, 0)), Plane(origin=(-121.565, 11.43, 4.7625), x_dir=(0, -1, 0), z_dir=(1, 0, 0)), Plane(origin=(-121.565, 11.43, 1.7145), x_dir=(0, 0, -1), z_dir=(1, 0, 0))) as fillet4_2_piece_3:
        with BuildLine():
            CenterArc((FILLET4_R, -FILLET4_R), FILLET4_R, 90, 90)
            Line((0, -FILLET4_R), (0, 0))
            Line((0, 0), (FILLET4_R, 0))
        make_face()
    extrude(amount=2.3, mode=Mode.SUBTRACT)

    # Fillet5
    fillet5_edges = [part_1.edges().sort_by_distance(p)[0] for p in [
        (-21.694130054, -12.8, 8.8075),
        (-27.694130054, -12.8, 8.8075),
        (-107.17090128, -9.412983007, 8.8075),
        (-114.3509, -3.903576215, 8.8075),
    ]]
    fillet(fillet5_edges, radius=FILLET5_R)


solid = part_1.part
